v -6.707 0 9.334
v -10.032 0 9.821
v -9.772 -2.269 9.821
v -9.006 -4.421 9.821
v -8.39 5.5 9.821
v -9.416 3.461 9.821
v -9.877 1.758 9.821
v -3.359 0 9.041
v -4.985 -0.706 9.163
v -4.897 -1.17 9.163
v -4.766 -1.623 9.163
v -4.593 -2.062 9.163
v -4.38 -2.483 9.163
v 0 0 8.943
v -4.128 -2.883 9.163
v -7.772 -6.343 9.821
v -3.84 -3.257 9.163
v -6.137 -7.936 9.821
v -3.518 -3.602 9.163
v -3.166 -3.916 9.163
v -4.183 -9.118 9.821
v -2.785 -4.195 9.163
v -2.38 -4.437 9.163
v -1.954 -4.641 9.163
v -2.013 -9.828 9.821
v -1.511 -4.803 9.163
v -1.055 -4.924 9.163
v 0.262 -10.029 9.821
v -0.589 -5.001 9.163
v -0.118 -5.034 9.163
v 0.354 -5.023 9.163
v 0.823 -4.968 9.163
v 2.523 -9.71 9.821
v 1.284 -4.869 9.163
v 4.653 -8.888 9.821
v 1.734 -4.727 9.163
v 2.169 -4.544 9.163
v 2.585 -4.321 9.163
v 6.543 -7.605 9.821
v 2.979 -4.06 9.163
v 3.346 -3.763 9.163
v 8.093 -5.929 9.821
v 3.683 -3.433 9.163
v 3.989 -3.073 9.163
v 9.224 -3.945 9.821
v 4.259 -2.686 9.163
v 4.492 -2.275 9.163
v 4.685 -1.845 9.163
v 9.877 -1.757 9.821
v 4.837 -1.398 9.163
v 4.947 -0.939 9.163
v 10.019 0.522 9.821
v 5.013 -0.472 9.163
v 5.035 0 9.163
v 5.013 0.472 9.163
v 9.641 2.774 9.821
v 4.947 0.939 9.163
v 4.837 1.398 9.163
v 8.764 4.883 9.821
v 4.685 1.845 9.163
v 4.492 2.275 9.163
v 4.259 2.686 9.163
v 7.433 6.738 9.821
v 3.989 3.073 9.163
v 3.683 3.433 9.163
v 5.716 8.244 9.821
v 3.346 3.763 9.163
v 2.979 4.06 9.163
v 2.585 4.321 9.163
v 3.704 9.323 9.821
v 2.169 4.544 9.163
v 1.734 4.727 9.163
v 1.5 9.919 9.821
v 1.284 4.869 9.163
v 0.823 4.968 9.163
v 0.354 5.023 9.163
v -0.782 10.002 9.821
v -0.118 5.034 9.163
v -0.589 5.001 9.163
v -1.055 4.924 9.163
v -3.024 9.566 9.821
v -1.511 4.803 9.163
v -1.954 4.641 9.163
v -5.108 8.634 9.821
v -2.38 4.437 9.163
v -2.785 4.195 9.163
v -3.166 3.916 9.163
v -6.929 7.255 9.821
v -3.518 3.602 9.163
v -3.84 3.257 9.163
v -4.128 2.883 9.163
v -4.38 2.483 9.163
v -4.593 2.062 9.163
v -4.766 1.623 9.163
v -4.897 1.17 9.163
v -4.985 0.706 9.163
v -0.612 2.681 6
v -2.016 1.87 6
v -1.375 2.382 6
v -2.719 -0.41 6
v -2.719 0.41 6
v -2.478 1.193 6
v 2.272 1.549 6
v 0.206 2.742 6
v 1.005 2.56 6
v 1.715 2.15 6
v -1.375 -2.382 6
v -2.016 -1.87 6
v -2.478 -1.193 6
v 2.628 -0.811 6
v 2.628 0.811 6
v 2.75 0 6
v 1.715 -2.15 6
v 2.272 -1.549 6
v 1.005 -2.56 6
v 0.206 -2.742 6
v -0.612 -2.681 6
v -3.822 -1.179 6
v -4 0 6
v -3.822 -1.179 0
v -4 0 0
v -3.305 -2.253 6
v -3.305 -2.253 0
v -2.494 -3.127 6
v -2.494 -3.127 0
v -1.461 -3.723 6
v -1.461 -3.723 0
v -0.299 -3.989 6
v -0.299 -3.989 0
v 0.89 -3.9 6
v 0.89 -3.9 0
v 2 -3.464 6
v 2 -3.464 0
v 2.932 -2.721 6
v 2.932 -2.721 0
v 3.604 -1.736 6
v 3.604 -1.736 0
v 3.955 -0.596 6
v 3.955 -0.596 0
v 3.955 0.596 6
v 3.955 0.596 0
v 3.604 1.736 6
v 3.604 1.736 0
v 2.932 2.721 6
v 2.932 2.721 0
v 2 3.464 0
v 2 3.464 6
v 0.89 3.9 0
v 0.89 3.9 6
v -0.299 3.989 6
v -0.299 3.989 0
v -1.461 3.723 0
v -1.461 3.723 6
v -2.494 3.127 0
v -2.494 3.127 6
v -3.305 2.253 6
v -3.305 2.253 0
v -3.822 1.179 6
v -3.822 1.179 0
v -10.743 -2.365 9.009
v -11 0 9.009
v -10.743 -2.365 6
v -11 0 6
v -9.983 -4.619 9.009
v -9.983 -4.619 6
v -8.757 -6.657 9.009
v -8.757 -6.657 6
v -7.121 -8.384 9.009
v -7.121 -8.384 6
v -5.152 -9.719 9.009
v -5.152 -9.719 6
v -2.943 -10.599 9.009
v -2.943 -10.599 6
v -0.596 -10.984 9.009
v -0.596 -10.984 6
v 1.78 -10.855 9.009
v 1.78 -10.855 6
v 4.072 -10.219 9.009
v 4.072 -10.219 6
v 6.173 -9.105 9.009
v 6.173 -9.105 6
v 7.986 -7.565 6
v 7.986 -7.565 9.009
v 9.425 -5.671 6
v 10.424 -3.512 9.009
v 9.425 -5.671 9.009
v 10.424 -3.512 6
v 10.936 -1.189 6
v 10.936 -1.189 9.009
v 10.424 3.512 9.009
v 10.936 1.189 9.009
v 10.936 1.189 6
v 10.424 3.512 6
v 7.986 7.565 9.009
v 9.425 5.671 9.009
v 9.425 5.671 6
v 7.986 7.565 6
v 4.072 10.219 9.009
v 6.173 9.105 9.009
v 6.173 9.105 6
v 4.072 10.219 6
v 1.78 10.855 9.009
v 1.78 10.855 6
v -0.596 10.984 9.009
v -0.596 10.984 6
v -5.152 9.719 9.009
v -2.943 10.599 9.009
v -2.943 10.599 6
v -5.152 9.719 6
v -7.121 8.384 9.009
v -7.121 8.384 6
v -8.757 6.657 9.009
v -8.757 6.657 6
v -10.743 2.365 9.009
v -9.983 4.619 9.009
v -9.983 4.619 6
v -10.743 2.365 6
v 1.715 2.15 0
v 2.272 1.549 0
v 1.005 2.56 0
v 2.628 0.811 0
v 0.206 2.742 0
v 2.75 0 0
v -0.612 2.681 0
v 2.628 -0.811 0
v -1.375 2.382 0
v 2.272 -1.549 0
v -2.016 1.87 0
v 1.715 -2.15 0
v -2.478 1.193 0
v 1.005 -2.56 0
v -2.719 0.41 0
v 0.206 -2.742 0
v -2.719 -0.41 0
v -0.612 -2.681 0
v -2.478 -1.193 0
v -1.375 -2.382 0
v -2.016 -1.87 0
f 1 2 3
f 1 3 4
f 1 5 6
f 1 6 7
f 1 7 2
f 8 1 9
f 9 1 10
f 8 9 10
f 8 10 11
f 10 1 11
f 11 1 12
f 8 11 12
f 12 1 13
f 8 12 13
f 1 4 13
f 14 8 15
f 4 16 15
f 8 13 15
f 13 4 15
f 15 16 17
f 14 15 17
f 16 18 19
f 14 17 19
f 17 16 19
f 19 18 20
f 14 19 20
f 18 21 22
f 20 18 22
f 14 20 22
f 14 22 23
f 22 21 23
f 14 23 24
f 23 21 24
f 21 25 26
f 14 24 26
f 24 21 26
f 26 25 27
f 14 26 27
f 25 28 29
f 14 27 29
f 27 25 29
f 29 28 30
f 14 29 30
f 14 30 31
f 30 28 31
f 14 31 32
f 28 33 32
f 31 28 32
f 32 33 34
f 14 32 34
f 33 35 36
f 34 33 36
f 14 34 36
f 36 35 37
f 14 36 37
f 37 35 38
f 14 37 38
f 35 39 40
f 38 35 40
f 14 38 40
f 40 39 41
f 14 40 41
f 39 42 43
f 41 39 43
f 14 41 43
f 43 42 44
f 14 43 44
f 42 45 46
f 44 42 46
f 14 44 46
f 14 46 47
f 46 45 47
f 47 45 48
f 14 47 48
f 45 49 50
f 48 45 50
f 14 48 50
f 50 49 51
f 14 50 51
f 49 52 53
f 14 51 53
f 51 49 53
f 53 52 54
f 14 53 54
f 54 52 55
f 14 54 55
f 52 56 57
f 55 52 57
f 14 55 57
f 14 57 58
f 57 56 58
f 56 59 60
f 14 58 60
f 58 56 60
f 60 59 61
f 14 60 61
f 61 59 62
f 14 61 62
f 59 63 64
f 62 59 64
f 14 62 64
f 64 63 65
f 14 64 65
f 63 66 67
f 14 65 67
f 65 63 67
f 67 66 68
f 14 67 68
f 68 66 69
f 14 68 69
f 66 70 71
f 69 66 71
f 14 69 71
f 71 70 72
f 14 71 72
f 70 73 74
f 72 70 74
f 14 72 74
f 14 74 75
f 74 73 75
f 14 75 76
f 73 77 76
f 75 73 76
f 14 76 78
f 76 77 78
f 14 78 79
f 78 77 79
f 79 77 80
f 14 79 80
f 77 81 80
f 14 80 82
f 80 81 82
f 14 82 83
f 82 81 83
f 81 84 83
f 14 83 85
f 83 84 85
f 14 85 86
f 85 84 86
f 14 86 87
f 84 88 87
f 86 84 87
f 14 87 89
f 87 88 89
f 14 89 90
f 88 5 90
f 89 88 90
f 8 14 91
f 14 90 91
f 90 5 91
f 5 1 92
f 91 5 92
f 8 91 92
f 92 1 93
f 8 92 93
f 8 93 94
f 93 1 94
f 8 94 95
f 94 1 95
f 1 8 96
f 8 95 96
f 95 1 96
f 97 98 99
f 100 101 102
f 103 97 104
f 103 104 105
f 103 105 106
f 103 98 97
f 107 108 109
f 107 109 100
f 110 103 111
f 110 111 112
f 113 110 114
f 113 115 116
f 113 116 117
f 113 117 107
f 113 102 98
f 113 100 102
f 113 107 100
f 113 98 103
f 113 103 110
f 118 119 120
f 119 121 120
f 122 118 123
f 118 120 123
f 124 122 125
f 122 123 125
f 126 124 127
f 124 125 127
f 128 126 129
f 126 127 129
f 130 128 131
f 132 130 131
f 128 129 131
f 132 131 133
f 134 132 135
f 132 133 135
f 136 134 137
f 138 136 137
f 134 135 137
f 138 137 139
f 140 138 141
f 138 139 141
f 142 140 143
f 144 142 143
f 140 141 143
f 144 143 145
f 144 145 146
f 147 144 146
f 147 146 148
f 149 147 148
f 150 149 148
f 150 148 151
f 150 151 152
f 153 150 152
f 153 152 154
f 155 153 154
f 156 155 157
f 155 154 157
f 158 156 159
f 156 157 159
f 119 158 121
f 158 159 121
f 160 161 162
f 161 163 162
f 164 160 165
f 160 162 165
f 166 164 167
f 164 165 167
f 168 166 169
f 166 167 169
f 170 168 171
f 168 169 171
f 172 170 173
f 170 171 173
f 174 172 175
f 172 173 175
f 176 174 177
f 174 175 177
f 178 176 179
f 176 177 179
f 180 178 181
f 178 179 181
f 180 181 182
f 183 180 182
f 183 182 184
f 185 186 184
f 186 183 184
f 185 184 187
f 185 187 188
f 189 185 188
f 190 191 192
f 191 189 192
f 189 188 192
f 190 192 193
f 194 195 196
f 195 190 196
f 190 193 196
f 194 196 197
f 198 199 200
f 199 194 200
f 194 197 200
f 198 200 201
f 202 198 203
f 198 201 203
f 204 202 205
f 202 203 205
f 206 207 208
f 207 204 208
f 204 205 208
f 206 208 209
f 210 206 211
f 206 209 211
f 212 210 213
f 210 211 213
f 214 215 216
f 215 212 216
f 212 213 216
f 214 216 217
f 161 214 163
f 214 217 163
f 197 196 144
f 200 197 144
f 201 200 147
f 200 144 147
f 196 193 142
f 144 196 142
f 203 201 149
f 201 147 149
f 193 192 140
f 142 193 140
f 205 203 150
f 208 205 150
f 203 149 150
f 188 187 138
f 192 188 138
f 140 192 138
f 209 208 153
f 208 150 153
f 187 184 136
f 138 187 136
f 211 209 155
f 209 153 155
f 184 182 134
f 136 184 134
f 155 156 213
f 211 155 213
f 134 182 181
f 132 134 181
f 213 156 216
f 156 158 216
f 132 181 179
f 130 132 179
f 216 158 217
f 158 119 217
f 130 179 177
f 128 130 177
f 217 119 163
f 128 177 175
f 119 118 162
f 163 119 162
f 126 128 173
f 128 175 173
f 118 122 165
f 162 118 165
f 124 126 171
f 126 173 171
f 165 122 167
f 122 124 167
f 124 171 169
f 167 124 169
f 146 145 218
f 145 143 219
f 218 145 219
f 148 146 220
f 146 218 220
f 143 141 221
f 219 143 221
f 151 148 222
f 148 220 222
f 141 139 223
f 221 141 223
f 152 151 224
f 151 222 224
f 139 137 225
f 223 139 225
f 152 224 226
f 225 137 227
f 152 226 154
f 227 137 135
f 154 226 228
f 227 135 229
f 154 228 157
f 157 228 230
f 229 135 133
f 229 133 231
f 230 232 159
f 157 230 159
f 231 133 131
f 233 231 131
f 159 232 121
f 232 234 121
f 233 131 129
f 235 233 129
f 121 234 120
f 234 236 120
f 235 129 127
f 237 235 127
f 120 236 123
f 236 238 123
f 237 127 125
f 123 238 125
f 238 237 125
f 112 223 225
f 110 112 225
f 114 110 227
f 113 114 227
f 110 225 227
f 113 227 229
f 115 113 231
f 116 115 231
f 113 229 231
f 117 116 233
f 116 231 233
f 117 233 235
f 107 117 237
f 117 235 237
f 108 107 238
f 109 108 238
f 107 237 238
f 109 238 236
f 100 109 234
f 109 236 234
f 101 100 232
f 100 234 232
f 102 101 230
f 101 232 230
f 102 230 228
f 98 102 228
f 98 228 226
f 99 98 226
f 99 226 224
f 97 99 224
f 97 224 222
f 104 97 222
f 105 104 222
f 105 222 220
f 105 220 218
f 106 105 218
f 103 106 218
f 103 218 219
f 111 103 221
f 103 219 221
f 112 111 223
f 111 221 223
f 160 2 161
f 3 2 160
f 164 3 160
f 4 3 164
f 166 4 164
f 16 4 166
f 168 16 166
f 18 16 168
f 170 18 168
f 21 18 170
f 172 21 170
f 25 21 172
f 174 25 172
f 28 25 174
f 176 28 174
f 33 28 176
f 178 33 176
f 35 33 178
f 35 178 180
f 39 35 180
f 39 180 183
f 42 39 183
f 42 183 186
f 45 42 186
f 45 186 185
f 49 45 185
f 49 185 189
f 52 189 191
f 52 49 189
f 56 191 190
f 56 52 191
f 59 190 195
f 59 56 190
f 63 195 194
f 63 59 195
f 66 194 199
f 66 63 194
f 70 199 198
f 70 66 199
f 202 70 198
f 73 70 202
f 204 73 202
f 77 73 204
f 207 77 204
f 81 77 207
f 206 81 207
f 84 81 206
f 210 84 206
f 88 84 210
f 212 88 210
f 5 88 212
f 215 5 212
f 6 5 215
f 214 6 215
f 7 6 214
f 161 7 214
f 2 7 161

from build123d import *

# Parameters (mm, degrees)
F3_R     = 2.75
F4_DEPTH = 6


# Not quite as in the source:
# - a fillet or chamfer that OpenCascade refuses, or shapes differently, is made with other operations: its cross-section is extruded or revolved along the edge and cut away or added


with BuildPart() as f1:
    # F0 (on Front) → F1 (revolve)
    with BuildSketch(Plane.XZ):
        with BuildLine():
            Line((-4, 6), (-4, 0))
            Line((-4, 0), (0, 0))
            Line((0, 0), (0, 8.9428911653))
            ThreePointArc((0, 8.9428911653), (-5.525338883, 9.2077757466), (-11, 10))
            Line((-11, 10), (-11, 6))
            Line((-11, 6), (-4, 6))
        make_face()
    revolve(axis=Axis((0, 0, 4.4714455826), (0, 0, 1)))

    # F2: chamfer of 1 on 1 edges, made by hand

    # F2_s1 → F2_t2 (revolve, cut)
    with BuildSketch(Plane.XZ):
        with BuildLine():
            Line((-11.0306422703, 8.9829547915), (-10.0014779949, 9.846492555))
            Line((-10.0014779949, 9.846492555), (-9.9980042766, 9.866188577))
            ThreePointArc((-9.9980042766, 9.866188577), (-10.5002890164, 9.9256794224), (-10.996191144, 10.0196339659))
            Line((-10.996191144, 10.0196339659), (-11.02, 10))
            ThreePointArc((-11.02, 10), (-11.02, 9.4914773958), (-11.0506422703, 8.9829547915))
            Line((-11.0506422703, 8.9829547915), (-11.0306422703, 8.9829547915))
        make_face()
    revolve(axis=Axis((0, 0, 10), (0, 0, 1)), mode=Mode.SUBTRACT)

    # F3 (on face) → F4 (cut)
    with BuildSketch(Plane(origin=(0, 0, 0), x_dir=(1, 0, 0), z_dir=(0, 0, -1))):
        Circle(F3_R)
    extrude(amount=-F4_DEPTH, mode=Mode.SUBTRACT)


solid = f1.part
